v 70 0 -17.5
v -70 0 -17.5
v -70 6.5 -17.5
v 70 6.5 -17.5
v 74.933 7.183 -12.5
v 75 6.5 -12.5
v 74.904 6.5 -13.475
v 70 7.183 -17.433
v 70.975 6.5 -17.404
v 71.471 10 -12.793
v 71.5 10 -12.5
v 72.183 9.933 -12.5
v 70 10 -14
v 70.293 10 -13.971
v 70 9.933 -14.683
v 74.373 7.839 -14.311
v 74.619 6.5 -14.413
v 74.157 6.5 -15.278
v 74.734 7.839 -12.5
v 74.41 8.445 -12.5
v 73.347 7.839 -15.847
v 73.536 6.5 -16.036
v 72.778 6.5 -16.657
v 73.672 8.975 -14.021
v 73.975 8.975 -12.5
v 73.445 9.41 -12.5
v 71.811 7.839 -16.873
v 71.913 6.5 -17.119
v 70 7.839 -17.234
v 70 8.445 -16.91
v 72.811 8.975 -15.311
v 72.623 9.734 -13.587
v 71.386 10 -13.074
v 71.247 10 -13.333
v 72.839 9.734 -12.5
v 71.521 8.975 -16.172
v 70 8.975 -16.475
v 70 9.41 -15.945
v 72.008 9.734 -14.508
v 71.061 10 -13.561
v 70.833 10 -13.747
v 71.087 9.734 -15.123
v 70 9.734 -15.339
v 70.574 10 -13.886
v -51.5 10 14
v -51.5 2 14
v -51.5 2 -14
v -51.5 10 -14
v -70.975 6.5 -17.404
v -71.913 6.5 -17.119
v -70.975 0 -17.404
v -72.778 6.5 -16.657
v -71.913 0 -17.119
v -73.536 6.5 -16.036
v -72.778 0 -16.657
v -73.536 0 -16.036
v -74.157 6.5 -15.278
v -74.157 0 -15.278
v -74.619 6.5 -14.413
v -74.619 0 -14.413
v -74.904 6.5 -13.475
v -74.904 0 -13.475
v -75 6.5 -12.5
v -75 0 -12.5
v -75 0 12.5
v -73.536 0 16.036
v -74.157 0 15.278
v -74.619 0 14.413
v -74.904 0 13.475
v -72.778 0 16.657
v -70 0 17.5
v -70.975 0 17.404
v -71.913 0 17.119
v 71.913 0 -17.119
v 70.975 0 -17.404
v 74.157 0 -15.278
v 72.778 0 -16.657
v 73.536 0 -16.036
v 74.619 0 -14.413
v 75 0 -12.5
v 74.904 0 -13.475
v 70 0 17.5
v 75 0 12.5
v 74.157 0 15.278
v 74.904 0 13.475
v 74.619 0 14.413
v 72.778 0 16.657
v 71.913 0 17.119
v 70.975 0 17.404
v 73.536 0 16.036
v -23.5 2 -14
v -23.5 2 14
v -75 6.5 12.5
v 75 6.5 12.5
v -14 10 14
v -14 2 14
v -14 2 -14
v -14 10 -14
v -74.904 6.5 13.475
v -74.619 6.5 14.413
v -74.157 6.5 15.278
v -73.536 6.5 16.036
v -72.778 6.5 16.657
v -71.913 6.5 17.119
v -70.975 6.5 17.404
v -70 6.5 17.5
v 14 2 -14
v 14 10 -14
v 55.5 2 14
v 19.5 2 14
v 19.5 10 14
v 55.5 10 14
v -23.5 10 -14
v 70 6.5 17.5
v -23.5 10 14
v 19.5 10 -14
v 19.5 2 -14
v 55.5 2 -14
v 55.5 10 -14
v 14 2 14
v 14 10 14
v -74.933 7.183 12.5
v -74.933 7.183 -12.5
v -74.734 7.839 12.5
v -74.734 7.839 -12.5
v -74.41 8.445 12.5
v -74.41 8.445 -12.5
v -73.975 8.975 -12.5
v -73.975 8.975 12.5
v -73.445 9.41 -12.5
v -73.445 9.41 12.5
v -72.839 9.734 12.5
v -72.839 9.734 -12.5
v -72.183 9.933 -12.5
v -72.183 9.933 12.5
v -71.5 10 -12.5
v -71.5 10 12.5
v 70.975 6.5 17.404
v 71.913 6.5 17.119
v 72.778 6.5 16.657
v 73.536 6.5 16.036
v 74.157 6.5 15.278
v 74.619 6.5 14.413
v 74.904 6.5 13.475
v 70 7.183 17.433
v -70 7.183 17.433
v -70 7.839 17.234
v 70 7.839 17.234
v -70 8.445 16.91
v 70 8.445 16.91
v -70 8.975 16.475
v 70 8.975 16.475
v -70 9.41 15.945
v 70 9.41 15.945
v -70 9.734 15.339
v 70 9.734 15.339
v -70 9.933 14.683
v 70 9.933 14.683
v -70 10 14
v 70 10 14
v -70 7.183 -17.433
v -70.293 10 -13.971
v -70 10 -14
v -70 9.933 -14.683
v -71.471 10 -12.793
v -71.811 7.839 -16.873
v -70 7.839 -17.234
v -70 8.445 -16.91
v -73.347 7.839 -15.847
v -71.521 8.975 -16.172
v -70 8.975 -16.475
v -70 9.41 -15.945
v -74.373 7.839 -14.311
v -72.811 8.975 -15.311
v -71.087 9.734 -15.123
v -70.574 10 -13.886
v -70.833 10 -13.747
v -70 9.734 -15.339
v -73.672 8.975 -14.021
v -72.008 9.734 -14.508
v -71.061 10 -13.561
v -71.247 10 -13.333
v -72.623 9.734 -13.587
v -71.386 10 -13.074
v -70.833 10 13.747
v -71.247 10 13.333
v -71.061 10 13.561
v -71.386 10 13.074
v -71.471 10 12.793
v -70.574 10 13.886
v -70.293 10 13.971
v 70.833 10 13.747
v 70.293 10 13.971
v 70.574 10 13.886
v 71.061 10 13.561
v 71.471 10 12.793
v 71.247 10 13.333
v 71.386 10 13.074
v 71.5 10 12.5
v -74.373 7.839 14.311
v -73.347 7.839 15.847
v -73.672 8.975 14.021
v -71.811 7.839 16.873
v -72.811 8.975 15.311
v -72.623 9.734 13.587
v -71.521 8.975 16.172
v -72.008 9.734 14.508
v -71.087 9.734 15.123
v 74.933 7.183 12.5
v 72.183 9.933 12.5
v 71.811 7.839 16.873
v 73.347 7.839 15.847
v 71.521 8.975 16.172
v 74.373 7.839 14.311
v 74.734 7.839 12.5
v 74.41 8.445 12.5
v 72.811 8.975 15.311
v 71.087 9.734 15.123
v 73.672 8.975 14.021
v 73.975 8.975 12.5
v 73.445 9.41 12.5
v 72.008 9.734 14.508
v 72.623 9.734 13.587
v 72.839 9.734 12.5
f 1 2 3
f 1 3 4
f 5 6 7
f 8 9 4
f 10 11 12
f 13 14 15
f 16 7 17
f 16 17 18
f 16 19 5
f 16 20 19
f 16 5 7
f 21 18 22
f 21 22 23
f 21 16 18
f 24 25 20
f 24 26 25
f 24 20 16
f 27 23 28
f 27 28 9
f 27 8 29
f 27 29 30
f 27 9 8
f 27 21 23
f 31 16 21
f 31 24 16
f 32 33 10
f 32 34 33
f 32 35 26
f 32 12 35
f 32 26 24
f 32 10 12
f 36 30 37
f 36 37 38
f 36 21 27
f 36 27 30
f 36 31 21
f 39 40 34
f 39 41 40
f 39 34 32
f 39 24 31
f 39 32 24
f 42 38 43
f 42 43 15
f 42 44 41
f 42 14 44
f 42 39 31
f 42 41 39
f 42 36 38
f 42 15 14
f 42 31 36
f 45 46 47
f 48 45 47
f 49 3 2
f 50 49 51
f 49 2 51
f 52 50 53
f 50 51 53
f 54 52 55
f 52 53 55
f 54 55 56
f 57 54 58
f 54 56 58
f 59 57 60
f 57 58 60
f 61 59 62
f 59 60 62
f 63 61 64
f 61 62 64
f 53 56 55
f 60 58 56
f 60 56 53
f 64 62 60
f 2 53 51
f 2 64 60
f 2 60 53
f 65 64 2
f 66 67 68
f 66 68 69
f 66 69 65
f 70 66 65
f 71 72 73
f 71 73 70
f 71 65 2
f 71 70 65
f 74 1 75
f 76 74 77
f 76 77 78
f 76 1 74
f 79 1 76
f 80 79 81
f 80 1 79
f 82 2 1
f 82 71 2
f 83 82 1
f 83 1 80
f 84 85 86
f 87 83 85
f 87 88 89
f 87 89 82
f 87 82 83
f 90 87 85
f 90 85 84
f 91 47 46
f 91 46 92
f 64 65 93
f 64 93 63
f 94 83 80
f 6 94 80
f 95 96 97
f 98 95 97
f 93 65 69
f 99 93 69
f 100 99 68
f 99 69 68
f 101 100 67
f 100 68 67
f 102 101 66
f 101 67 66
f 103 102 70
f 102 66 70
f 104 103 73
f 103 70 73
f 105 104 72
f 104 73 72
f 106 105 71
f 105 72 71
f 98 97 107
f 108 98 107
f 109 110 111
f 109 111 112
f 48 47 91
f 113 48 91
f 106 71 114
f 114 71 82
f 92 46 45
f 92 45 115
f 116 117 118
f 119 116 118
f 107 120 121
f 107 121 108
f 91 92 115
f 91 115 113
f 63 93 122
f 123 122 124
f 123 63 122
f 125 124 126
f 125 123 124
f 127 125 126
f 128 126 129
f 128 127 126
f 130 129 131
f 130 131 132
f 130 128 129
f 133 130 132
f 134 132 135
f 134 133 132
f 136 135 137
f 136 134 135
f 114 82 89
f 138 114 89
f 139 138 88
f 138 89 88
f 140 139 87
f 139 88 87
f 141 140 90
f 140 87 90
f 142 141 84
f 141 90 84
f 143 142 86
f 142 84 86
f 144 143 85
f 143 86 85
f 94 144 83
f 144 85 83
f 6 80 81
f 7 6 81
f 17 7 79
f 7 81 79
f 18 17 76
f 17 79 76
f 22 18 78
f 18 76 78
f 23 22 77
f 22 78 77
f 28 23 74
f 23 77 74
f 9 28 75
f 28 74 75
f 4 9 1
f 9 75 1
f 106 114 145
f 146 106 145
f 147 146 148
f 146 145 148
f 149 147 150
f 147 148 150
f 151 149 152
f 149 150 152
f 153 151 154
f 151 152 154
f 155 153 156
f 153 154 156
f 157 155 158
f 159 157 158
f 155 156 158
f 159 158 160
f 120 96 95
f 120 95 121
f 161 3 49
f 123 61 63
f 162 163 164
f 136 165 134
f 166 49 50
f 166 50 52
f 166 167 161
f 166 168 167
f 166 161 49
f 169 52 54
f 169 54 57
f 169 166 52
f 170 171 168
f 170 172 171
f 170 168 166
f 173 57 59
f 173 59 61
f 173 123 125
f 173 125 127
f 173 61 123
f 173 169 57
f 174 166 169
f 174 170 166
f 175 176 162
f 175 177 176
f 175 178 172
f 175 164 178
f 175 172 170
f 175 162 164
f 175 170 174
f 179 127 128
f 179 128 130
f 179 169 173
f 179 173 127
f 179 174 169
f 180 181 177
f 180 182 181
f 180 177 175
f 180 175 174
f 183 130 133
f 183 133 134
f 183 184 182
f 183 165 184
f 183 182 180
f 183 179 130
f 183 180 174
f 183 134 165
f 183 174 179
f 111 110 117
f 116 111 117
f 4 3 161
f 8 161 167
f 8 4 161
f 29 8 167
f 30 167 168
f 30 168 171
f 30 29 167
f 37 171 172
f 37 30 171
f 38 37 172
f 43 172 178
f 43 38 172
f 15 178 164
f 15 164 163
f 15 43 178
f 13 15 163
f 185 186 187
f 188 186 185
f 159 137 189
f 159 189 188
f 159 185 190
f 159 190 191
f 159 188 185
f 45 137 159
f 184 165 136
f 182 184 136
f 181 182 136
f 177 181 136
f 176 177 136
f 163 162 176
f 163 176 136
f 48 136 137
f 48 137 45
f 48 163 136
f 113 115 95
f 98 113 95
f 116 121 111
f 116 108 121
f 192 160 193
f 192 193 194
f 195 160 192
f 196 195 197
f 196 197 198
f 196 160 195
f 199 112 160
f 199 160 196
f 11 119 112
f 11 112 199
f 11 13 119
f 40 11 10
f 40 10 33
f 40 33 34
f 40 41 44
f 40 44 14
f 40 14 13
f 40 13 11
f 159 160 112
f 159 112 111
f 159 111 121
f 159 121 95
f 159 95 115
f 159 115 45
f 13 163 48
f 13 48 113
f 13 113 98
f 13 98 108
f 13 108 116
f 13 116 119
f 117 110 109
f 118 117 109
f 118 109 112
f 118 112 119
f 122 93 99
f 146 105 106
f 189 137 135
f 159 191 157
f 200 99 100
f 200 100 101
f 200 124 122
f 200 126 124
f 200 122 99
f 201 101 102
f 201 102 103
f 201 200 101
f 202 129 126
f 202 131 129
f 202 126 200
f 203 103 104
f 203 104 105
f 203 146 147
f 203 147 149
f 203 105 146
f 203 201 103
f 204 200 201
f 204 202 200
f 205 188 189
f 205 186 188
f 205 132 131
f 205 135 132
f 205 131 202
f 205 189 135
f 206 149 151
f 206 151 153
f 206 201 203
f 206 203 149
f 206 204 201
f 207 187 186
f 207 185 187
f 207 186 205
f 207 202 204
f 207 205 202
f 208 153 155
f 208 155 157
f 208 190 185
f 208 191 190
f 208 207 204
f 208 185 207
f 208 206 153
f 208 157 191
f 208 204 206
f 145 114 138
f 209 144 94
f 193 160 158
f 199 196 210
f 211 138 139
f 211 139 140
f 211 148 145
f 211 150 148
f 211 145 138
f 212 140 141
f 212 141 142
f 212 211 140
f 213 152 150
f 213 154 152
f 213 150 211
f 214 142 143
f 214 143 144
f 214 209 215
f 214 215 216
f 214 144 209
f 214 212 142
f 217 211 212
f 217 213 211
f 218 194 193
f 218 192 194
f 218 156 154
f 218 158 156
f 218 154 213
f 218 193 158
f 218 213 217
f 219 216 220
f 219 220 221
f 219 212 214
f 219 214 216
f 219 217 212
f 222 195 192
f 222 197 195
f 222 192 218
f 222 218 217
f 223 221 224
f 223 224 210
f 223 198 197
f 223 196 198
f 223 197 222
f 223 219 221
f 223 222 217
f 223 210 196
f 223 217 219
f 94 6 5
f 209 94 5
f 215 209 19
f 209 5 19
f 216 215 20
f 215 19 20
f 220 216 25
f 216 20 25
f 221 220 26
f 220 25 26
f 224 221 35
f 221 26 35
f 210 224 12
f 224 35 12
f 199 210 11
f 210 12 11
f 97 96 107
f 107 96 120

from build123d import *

# Parameters (mm, degrees)
SKETCH1_W           = 150
SKETCH1_H           = 35
SKETCH1_W_2         = 28
SKETCH1_H_2         = 28
SKETCH1_W_3         = 36
BOSS_EXTRUDE1_DEPTH = 10
SKETCH2_W           = 28
SKETCH2_H           = 28
SKETCH2_W_2         = 36
BOSS_EXTRUDE2_DEPTH = 2
FILLET3_R           = 3.5
FILLET4_R           = 5


# Some blends are built 0.0001 mm under size
with BuildPart() as part:
    # Sketch1 → Boss-Extrude1 (new body)
    with BuildSketch(Plane(origin=(0, 0, 0), x_dir=(1, 0, 0), z_dir=(0, 1, 0))):
        Rectangle(SKETCH1_W, SKETCH1_H)
        Rectangle(SKETCH1_W_2, SKETCH1_H_2, mode=Mode.SUBTRACT)
        with Locations((-37.5, 0)):
            Rectangle(SKETCH1_W_2, SKETCH1_H_2, mode=Mode.SUBTRACT)
        with Locations((37.5, 0)):
            Rectangle(SKETCH1_W_3, SKETCH1_H_2, mode=Mode.SUBTRACT)
    extrude(amount=BOSS_EXTRUDE1_DEPTH)

    # Sketch2 → Boss-Extrude2 (add)
    with BuildSketch(Plane.XZ):
        with Locations((-37.5, 0)):
            Rectangle(SKETCH2_W, SKETCH2_H)
        Rectangle(SKETCH2_W, SKETCH2_H)
        with Locations((37.5, 0)):
            Rectangle(SKETCH2_W_2, SKETCH2_H)
    extrude(amount=-BOSS_EXTRUDE2_DEPTH)

    # Fillet3
    fillet3_edges = [part.edges().sort_by_distance(p)[0] for p in [
        (-75, 10, 0),
        (0, 10, 17.5),
        (75, 10, 0),
        (0, 10, -17.5),
    ]]
    fillet(fillet3_edges, radius=FILLET3_R - 0.0001)  # a hair under: the kernel refuses the full size

    # Fillet4
    # the kernel refuses this fillet: 5 mm, written as the material it takes off along each edge
    with BuildSketch(Plane(origin=(70, 10, -12.5), x_dir=(1, 0, 0), z_dir=(0, 0, 1))) as fillet4_piece_1:
        with BuildLine():
            CenterArc((1.5001, -3.4999), 3.4999, 0, 90)
            Line((5, -3.4999), (5, 0))
            Line((5, 0), (1.5001, 0))
        make_face()
    revolve(axis=Axis((70, 10, -12.5), (0, 1, 0)), revolution_arc=90, mode=Mode.SUBTRACT)
    with BuildSketch(Plane(origin=(70, 10, 12.5), x_dir=(0, 0, 1), z_dir=(-1, 0, 0))) as fillet4_piece_2:
        with BuildLine():
            CenterArc((1.5001, -3.4999), 3.4999, 0, 90)
            Line((5, -3.4999), (5, 0))
            Line((5, 0), (1.5001, 0))
        make_face()
    revolve(axis=Axis((70, 10, 12.5), (0, 1, 0)), revolution_arc=90, mode=Mode.SUBTRACT)
    with BuildSketch(Plane(origin=(-70, 10, -12.5), x_dir=(0, 0, -1), z_dir=(1, 0, 0))) as fillet4_piece_3:
        with BuildLine():
            CenterArc((1.5001, -3.4999), 3.4999, 0, 90)
            Line((5, -3.4999), (5, 0))
            Line((5, 0), (1.5001, 0))
        make_face()
    revolve(axis=Axis((-70, 10, -12.5), (0, 1, 0)), revolution_arc=90, mode=Mode.SUBTRACT)
    with BuildSketch(Plane(origin=(-70, 10, 12.5), x_dir=(-1, 0, 0), z_dir=(0, 0, -1))) as fillet4_piece_4:
        with BuildLine():
            CenterArc((1.5001, -3.4999), 3.4999, 0, 90)
            Line((5, -3.4999), (5, 0))
            Line((5, 0), (1.5001, 0))
        make_face()
    revolve(axis=Axis((-70, 10, 12.5), (0, 1, 0)), revolution_arc=90, mode=Mode.SUBTRACT)
    with BuildSketch(Plane(origin=(-75, -12.5, 17.5), x_dir=(1, 0, 0), z_dir=(0, 1, 0)), Plane(origin=(-75, -12.5, -17.5), x_dir=(0, 0, 1), z_dir=(0, 1, 0))) as fillet4_piece_5:
        with BuildLine():
            CenterArc((FILLET4_R, FILLET4_R), FILLET4_R, 180, 90)
            Line((0, FILLET4_R), (0, 0))
            Line((0, 0), (FILLET4_R, 0))
        make_face()
    extrude(amount=22.5, mode=Mode.SUBTRACT)
    with BuildSketch(Plane(origin=(75, -12.5, -17.5), x_dir=(0, 0, 1), z_dir=(0, 1, 0)), Plane(origin=(75, -12.5, 17.5), x_dir=(-1, 0, 0), z_dir=(0, 1, 0))) as fillet4_piece_6:
        with BuildLine():
            CenterArc((FILLET4_R, -FILLET4_R), FILLET4_R, 90, 90)
            Line((0, -FILLET4_R), (0, 0))
            Line((0, 0), (FILLET4_R, 0))
        make_face()
    extrude(amount=22.5, mode=Mode.SUBTRACT)


solid = part.part
